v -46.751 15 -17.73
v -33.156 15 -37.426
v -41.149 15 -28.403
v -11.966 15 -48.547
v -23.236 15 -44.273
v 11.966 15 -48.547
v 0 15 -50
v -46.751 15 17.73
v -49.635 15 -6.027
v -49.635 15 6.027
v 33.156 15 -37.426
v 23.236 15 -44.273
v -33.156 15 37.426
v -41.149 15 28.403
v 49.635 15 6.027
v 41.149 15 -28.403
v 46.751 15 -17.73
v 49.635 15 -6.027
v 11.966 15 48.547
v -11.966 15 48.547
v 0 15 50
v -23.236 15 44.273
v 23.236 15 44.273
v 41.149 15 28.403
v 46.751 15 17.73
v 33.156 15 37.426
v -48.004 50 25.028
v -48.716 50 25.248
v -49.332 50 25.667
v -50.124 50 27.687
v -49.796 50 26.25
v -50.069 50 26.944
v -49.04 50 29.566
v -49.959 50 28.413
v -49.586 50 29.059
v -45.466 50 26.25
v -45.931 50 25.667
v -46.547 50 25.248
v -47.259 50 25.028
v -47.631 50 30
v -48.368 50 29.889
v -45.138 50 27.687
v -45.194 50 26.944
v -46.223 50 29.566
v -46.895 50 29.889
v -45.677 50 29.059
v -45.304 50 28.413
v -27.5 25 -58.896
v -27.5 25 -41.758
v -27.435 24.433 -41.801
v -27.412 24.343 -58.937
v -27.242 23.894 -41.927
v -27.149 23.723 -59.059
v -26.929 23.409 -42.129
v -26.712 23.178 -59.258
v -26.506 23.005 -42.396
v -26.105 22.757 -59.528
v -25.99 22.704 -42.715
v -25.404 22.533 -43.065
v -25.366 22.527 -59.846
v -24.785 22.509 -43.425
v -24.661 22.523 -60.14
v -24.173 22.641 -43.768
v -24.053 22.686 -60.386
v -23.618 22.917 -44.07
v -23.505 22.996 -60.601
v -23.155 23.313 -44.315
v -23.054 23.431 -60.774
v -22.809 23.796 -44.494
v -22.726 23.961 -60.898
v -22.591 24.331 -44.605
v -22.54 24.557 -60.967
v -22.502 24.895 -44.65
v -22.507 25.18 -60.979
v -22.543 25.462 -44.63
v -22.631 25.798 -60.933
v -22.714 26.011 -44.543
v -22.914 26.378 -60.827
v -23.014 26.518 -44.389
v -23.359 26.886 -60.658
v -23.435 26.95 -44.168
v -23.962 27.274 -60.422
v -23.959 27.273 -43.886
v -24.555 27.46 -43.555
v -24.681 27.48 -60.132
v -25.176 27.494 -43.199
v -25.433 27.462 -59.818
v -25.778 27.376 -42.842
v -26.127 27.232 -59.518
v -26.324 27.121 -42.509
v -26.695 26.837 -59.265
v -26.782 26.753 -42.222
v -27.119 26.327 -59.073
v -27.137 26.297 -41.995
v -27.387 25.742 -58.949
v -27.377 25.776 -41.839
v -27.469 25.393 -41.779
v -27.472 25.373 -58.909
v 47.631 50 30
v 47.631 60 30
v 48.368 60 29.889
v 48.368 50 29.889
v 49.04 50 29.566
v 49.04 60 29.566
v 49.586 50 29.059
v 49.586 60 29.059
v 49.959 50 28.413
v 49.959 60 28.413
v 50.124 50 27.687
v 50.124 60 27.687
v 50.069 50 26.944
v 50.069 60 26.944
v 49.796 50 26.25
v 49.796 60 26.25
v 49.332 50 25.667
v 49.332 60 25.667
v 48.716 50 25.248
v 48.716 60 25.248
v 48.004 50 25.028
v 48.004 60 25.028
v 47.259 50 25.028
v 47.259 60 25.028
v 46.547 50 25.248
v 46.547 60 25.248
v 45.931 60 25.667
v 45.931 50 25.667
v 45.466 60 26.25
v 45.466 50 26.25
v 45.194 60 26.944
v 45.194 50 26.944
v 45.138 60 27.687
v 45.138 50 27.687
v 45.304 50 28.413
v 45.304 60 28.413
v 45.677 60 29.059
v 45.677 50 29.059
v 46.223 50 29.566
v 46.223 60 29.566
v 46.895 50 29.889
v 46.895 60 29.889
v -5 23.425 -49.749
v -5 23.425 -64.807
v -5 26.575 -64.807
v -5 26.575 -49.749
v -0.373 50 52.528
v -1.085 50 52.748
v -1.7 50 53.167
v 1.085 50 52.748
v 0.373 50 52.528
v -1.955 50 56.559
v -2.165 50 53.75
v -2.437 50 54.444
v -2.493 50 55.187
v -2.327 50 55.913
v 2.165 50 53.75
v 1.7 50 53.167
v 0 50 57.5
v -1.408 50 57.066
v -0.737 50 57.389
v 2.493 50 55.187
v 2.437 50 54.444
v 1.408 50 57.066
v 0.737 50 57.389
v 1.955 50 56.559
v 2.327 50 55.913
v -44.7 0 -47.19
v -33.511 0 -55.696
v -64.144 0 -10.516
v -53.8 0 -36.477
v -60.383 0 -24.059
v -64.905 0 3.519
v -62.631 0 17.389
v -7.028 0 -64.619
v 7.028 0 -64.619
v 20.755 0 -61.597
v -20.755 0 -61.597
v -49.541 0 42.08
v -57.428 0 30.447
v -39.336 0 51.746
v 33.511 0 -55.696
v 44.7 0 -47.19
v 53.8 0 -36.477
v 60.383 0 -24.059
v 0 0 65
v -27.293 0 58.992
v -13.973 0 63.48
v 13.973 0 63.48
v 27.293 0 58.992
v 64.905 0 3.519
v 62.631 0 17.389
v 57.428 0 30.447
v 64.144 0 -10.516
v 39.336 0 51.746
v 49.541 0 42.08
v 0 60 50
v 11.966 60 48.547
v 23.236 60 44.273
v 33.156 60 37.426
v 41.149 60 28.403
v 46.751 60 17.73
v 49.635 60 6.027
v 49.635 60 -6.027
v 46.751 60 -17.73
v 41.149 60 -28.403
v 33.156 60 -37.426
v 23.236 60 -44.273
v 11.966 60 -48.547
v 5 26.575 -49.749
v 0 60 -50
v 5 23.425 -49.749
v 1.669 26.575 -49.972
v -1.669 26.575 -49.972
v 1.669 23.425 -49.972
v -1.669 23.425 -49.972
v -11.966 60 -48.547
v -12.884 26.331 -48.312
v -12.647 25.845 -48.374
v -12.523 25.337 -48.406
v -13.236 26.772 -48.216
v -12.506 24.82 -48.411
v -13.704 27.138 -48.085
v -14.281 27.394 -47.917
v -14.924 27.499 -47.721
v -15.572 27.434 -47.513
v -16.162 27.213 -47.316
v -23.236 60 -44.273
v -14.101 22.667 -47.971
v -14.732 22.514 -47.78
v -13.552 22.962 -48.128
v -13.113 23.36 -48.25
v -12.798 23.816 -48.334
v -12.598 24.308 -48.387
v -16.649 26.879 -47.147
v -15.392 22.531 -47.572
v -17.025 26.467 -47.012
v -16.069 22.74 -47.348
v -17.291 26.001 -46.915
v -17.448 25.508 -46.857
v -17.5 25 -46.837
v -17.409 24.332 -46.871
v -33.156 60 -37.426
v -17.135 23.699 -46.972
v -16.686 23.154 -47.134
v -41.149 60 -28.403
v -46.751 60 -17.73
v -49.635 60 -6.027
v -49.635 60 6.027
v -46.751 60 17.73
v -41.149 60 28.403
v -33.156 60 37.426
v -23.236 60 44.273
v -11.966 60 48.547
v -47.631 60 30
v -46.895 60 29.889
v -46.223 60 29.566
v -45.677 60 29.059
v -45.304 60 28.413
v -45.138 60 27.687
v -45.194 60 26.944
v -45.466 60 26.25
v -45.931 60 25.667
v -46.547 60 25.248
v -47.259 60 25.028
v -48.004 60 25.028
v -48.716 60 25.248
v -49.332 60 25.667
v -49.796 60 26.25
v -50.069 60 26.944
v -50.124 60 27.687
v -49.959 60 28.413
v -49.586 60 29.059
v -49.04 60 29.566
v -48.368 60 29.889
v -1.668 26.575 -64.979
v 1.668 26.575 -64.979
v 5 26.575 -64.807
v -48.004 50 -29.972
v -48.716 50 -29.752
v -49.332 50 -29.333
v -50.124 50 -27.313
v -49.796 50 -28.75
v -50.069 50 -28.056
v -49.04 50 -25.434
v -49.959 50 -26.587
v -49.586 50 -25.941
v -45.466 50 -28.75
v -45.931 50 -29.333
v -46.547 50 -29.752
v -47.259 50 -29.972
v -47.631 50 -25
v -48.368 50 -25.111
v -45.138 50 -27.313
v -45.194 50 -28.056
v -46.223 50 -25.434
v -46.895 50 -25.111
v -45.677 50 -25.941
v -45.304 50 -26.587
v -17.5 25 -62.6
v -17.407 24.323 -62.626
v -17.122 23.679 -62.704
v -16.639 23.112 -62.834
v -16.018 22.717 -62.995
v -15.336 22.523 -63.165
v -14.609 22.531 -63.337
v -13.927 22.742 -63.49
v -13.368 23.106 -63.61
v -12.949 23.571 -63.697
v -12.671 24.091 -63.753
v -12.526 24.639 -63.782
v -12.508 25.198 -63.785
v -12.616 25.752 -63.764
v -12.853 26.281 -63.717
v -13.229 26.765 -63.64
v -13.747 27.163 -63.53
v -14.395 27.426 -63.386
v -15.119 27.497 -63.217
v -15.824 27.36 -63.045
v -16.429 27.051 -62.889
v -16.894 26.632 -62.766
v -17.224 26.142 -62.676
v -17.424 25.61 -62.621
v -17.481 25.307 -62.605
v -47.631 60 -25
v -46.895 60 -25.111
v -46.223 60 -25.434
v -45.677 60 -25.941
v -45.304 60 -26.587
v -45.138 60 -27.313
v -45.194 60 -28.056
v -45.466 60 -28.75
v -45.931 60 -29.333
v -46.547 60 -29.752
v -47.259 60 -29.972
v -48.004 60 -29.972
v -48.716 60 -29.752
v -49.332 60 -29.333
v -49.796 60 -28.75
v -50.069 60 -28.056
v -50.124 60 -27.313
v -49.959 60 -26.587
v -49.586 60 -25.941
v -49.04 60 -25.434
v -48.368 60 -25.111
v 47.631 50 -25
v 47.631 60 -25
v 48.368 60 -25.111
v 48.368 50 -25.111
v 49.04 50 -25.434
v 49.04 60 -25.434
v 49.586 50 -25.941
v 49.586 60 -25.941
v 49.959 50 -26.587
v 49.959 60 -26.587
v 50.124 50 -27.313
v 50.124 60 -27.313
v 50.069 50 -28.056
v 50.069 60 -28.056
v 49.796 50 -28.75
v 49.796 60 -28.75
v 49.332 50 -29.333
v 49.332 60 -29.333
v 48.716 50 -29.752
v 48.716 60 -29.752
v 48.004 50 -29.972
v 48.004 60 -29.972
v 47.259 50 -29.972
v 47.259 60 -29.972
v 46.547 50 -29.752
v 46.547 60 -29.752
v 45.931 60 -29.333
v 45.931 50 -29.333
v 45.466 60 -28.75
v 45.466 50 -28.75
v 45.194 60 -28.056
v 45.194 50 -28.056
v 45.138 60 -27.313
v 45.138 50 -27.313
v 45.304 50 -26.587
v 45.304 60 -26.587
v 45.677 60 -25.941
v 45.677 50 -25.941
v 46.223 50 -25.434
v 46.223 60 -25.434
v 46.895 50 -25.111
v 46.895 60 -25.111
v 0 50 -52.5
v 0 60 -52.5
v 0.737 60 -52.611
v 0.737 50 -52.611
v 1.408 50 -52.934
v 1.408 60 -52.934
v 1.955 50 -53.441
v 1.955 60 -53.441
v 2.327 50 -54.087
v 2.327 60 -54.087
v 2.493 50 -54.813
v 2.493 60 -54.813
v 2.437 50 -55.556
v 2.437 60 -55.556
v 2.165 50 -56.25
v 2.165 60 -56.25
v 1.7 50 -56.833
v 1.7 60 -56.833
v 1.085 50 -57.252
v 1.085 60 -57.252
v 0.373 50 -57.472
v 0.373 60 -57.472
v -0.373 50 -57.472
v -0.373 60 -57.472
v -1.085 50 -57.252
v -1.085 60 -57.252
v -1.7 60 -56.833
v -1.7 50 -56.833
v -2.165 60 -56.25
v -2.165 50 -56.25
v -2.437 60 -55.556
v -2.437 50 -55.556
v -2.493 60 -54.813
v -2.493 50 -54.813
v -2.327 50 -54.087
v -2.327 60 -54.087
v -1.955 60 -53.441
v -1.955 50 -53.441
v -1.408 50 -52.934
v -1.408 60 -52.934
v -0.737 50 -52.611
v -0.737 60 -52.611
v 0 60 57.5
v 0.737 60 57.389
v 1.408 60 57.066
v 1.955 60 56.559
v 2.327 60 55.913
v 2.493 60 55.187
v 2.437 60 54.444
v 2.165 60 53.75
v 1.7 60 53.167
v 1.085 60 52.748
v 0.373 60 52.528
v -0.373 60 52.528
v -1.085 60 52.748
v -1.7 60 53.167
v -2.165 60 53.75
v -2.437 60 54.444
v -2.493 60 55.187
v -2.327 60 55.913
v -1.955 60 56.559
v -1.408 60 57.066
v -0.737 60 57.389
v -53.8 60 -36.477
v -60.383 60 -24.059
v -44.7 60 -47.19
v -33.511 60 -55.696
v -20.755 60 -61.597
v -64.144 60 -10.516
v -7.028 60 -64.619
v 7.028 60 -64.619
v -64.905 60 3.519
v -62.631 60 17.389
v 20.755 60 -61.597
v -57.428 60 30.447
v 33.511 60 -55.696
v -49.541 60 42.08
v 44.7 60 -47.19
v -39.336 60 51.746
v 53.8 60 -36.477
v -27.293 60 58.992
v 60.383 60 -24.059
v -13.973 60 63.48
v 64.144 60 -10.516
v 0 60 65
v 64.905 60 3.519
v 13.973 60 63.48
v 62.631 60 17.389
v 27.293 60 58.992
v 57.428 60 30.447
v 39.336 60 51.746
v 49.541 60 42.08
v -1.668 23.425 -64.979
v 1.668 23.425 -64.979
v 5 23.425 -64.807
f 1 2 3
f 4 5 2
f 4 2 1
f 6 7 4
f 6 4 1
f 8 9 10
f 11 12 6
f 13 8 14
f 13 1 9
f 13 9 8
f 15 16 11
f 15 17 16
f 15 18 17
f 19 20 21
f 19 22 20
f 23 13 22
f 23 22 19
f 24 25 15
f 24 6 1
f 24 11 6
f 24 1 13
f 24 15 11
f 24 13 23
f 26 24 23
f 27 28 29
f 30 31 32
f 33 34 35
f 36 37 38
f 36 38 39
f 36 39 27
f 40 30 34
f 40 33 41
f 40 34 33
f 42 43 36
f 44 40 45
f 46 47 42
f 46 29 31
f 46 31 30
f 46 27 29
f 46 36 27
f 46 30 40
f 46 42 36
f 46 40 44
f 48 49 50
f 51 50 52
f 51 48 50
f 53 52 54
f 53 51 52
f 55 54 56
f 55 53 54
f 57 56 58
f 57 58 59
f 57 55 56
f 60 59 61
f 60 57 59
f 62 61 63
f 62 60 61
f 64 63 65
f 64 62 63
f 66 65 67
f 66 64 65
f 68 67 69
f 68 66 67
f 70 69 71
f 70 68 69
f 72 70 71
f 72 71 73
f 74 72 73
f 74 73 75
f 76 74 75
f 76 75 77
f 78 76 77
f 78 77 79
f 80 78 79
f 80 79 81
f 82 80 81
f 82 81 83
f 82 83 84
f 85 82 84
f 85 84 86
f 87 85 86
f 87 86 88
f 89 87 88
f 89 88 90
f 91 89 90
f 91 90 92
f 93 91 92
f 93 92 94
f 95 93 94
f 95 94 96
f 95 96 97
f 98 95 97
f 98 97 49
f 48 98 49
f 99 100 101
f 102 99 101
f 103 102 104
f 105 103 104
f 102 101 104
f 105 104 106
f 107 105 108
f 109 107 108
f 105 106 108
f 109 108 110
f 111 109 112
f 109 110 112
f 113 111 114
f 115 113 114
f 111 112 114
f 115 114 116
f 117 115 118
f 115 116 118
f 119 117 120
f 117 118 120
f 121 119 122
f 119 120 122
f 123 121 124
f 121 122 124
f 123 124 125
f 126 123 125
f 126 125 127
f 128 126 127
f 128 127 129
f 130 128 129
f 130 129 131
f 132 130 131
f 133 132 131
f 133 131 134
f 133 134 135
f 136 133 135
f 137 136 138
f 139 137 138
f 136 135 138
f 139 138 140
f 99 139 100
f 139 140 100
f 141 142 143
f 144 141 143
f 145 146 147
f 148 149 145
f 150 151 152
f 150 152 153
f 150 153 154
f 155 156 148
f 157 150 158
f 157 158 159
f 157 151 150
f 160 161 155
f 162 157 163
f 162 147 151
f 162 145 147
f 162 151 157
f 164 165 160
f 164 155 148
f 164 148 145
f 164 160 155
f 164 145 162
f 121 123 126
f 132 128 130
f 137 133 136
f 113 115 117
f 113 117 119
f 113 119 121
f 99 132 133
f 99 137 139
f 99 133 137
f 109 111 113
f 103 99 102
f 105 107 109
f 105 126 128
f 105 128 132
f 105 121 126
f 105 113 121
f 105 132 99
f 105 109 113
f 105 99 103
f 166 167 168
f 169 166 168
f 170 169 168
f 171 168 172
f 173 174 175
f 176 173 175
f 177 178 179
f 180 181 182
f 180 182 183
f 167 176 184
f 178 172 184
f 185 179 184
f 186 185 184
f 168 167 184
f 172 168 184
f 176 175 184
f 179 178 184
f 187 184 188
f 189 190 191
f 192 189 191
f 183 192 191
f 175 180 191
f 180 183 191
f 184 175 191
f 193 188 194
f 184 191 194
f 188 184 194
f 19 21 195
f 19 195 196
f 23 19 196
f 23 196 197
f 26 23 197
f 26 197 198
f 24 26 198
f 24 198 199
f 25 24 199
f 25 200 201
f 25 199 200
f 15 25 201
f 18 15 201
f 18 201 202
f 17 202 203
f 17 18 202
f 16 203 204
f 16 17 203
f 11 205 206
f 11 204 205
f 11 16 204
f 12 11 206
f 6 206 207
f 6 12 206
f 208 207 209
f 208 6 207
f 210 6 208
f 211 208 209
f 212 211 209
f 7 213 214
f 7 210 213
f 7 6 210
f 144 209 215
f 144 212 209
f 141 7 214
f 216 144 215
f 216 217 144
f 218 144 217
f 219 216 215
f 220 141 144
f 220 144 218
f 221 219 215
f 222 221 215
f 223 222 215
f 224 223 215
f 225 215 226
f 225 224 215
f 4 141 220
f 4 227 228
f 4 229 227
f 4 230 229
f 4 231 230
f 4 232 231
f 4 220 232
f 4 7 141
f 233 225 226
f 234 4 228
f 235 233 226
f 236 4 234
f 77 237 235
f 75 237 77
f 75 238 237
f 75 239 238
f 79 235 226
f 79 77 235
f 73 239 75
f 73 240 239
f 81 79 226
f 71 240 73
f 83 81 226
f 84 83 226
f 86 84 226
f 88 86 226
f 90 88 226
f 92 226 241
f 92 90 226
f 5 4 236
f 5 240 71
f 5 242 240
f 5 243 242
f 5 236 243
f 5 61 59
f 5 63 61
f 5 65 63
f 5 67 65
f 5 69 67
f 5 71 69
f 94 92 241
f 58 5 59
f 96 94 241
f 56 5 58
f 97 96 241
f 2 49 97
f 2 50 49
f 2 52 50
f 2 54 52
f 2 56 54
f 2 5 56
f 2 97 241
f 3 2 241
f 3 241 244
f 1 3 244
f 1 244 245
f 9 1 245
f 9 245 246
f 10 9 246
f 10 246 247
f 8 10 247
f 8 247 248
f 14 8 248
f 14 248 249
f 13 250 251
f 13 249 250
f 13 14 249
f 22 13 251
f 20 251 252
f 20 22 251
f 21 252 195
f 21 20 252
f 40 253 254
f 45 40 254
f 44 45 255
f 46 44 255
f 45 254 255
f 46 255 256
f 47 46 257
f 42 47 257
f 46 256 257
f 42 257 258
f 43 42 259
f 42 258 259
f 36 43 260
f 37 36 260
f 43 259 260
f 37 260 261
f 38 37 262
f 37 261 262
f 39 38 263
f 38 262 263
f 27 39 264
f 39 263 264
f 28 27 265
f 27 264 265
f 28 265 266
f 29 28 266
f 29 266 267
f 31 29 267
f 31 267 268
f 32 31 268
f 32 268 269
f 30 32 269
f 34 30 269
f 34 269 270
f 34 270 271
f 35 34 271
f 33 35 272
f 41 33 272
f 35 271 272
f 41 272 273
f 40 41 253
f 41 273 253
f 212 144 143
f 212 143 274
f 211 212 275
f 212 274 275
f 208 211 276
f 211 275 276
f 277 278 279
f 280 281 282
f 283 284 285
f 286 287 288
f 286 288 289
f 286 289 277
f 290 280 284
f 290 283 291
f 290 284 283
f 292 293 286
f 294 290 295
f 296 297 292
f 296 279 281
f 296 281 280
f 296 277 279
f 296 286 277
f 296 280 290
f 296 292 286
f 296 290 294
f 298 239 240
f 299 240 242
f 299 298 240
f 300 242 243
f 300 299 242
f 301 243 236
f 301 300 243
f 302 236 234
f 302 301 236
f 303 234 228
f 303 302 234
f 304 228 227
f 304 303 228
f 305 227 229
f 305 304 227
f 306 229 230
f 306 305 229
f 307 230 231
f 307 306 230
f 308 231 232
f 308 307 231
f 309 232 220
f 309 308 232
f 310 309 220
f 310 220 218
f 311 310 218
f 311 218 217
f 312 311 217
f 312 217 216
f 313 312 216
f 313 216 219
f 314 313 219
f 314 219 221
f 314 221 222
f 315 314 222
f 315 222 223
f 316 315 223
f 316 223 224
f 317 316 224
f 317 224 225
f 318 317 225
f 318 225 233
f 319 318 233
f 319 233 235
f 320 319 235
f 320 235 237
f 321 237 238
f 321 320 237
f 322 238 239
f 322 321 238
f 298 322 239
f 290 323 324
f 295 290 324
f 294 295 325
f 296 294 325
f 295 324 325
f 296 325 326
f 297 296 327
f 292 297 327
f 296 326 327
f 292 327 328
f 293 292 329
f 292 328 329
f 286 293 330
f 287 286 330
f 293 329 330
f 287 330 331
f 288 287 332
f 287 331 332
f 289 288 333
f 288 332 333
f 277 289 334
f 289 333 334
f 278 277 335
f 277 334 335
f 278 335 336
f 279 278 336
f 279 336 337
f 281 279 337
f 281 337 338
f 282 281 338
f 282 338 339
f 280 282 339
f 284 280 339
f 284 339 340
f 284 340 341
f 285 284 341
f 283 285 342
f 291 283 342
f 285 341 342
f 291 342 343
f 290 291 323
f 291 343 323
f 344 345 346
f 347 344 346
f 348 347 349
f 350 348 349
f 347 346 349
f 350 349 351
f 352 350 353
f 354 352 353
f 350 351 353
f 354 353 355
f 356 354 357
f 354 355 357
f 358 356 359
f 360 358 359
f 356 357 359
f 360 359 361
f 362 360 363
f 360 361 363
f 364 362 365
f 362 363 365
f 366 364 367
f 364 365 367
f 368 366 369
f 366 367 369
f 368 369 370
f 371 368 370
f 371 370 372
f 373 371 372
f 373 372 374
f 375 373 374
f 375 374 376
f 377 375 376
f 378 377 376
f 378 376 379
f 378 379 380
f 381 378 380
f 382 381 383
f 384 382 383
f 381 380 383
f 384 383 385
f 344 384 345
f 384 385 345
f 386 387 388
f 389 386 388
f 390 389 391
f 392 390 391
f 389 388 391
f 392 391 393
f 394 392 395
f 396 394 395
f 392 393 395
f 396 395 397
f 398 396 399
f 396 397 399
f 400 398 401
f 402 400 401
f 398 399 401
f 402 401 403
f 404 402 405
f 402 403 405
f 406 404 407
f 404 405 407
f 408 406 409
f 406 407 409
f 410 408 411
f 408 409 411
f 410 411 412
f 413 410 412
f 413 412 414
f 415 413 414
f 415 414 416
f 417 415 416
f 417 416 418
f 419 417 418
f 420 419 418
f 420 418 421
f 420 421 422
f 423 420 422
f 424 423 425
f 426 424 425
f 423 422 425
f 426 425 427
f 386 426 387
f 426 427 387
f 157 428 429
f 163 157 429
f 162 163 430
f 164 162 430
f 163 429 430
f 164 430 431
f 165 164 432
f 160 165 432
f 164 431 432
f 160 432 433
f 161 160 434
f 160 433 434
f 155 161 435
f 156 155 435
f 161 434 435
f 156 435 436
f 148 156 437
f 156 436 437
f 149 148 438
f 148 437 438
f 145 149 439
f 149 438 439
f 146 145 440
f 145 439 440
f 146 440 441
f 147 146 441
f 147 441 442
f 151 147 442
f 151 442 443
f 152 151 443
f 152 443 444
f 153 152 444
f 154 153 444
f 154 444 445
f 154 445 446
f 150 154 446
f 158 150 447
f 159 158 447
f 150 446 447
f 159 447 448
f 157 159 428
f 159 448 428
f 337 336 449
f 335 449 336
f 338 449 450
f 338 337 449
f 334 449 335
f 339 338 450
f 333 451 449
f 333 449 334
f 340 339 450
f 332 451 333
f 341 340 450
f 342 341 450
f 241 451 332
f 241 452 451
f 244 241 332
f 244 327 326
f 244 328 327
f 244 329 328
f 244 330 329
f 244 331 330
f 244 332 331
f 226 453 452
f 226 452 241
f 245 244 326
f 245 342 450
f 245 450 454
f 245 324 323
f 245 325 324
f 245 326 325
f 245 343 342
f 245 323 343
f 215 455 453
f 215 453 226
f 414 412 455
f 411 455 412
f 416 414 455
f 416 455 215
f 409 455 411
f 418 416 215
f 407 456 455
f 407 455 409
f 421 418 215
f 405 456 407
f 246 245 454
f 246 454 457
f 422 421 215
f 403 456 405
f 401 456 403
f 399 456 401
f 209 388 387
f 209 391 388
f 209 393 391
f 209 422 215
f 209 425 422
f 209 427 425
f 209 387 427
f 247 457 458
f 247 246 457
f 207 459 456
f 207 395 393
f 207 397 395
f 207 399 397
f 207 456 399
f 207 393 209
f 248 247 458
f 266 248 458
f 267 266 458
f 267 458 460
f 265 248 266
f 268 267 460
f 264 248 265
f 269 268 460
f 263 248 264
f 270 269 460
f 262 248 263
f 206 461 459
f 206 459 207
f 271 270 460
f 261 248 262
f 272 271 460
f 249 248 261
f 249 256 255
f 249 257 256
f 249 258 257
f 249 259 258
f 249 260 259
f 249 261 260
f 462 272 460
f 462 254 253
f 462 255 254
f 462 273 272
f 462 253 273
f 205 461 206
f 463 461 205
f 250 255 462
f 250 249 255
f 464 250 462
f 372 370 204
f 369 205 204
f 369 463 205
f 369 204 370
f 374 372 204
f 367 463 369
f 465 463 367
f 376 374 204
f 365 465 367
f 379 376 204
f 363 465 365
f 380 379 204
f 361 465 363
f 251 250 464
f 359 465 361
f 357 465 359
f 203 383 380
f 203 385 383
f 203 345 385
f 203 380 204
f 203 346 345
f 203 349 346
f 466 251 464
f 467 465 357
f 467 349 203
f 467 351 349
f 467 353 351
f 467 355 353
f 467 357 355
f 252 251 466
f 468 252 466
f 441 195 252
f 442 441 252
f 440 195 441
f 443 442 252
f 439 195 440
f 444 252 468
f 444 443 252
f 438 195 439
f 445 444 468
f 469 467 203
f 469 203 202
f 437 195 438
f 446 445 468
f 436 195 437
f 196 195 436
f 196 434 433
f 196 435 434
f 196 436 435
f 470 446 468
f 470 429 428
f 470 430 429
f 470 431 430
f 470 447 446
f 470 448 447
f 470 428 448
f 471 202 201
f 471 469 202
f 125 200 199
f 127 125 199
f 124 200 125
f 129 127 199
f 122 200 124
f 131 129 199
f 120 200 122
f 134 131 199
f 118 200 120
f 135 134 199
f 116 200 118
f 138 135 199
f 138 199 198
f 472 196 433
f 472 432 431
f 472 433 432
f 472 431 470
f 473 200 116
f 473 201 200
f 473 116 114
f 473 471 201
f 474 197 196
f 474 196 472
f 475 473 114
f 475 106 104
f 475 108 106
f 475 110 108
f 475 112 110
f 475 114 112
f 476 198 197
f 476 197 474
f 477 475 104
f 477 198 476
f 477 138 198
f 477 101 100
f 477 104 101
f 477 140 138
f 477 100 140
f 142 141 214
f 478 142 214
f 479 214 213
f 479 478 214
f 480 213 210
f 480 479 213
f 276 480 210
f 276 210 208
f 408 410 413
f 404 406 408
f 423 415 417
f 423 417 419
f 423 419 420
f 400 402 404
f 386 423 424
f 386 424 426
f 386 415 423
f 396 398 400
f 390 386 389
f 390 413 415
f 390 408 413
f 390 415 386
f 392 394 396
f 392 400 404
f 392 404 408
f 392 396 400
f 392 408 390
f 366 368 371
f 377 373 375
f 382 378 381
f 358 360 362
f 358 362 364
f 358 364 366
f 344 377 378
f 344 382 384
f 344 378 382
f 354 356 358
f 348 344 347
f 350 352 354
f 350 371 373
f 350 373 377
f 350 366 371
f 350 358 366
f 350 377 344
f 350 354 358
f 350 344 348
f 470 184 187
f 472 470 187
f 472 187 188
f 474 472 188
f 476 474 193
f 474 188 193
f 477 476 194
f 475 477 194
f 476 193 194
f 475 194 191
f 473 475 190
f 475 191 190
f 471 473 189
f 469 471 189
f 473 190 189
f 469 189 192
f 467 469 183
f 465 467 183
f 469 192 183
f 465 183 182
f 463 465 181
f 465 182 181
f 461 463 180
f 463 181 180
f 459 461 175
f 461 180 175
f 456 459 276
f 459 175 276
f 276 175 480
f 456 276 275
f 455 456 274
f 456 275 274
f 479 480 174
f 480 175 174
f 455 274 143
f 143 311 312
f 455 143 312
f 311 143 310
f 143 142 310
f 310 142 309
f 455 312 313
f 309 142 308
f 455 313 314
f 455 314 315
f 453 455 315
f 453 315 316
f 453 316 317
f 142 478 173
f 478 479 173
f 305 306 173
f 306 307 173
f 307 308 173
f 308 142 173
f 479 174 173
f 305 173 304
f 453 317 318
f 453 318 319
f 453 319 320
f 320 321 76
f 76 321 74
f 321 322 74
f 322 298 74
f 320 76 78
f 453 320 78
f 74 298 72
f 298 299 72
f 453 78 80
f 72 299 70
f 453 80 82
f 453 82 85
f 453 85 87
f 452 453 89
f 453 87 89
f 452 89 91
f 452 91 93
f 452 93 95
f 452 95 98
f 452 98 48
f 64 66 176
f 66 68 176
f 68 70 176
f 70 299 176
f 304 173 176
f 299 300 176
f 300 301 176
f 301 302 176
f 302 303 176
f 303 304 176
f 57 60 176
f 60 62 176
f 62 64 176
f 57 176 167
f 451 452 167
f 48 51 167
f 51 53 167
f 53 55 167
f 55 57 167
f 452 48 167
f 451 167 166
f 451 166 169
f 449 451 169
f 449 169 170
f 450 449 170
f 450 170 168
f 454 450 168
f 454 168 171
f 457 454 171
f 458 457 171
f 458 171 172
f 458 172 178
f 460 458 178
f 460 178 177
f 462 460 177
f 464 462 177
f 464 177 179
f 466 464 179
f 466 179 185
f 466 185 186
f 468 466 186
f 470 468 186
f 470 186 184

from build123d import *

# Parameters (mm, degrees)
CROQUIS1_R                 = 65
SALIENTE_EXTRUIR1_DEPTH    = 60
VACIADO1_T                 = -15
CROQUIS3_R                 = 2.5
CORTAR_EXTRUIR1_DEPTH      = 10
CORTAR_EXTRUIR2_REACH      = 190.992
CORTAR_EXTRUIR2_END_RADIUS = 50
CROQUIS4_R                 = 2.5
CROQUIS4_W                 = 10
CROQUIS4_H                 = 3.15


with BuildPart() as part:
    # Croquis1 → Saliente-Extruir1 (new body)
    with BuildSketch(Plane(origin=(0, 0, 0), x_dir=(1, 0, 0), z_dir=(0, 1, 0))):
        with Locations(Location((0, 0, 0), (0, 0, 270))):  # turned: the seam where the file's is
            Circle(CROQUIS1_R)
    extrude(amount=SALIENTE_EXTRUIR1_DEPTH)

    # Vaciado1
    vaciado1_openings = [part.faces().sort_by_distance(p)[0] for p in [
        (0, 60, 0),
    ]]
    offset(amount=VACIADO1_T, openings=vaciado1_openings, kind=Kind.INTERSECTION)

    # Croquis3 → Cortar-Extruir1 (cut)
    with BuildSketch(Plane(origin=(0, 60, 0), x_dir=(1, 0, 0), z_dir=(0, 1, 0))):
        with Locations(Location((0, 55, 0), (0, 0, 270))):  # turned: the seam where the file's is
            Circle(CROQUIS3_R)
        with Locations(Location((47.631397208, 27.5, 0), (0, 0, 270))):  # turned: the seam where the file's is
            Circle(CROQUIS3_R)
        with Locations(Location((47.631397208, -27.5, 0), (0, 0, 270))):  # turned: the seam where the file's is
            Circle(CROQUIS3_R)
        with Locations(Location((0, -55, 0), (0, 0, 270))):  # turned: the seam where the file's is
            Circle(CROQUIS3_R)
        with Locations(Location((-47.631397208, -27.5, 0), (0, 0, 270))):  # turned: the seam where the file's is
            Circle(CROQUIS3_R)
        with Locations(Location((-47.631397208, 27.5, 0), (0, 0, 270))):  # turned: the seam where the file's is
            Circle(CROQUIS3_R)
    extrude(amount=-CORTAR_EXTRUIR1_DEPTH, mode=Mode.SUBTRACT)

    # Cortar-Extruir2: up to this cylinder (the profile starts outside it)
    cortar_extruir2_end = Plane(origin=(0, 25, 0), z_dir=(0, -1, 0)) * Cylinder(CORTAR_EXTRUIR2_END_RADIUS, 482.984, mode=Mode.PRIVATE)
    # Croquis4 → Cortar-Extruir2 (cut, up to the surface)
    with BuildSketch(Plane(origin=(6.129951323, -2.103381064, -123.992328347), x_dir=(1, 0, 0), z_dir=(0, 0, 1)), mode=Mode.PRIVATE) as cortar_extruir2_sk1:
        with Locations(Location((-21.129951323, 27.103381064, 0), (0, 0, 180))):  # turned: the seam where the file's is
            Circle(CROQUIS4_R)
    cortar_extruir2_tool1 = extrude(cortar_extruir2_sk1.sketch, amount=CORTAR_EXTRUIR2_REACH, mode=Mode.PRIVATE) - cortar_extruir2_end
    add(cortar_extruir2_tool1.solids().sort_by_distance((-15, 25, -123.992328))[0], mode=Mode.SUBTRACT)
    # Croquis4 → Cortar-Extruir2 (cut, up to the surface)
    with BuildSketch(Plane(origin=(6.129951323, -2.103381064, -123.992328347), x_dir=(1, 0, 0), z_dir=(0, 0, 1)), mode=Mode.PRIVATE) as cortar_extruir2_sk2:
        with Locations(Location((-31.129951323, 27.103381064, 0), (0, 0, 180))):  # turned: the seam where the file's is
            Circle(CROQUIS4_R)
    cortar_extruir2_tool2 = extrude(cortar_extruir2_sk2.sketch, amount=CORTAR_EXTRUIR2_REACH, mode=Mode.PRIVATE) - cortar_extruir2_end
    add(cortar_extruir2_tool2.solids().sort_by_distance((-25, 25, -123.992328))[0], mode=Mode.SUBTRACT)
    # Croquis4 → Cortar-Extruir2 (cut, up to the surface)
    with BuildSketch(Plane(origin=(6.129951323, -2.103381064, -123.992328347), x_dir=(1, 0, 0), z_dir=(0, 0, 1)), mode=Mode.PRIVATE) as cortar_extruir2_sk3:
        with Locations((-6.129951323, 27.103381064)):
            Rectangle(CROQUIS4_W, CROQUIS4_H)
    cortar_extruir2_tool3 = extrude(cortar_extruir2_sk3.sketch, amount=CORTAR_EXTRUIR2_REACH, mode=Mode.PRIVATE) - cortar_extruir2_end
    add(cortar_extruir2_tool3.solids().sort_by_distance((0, 25, -123.992328))[0], mode=Mode.SUBTRACT)


solid = part.part
